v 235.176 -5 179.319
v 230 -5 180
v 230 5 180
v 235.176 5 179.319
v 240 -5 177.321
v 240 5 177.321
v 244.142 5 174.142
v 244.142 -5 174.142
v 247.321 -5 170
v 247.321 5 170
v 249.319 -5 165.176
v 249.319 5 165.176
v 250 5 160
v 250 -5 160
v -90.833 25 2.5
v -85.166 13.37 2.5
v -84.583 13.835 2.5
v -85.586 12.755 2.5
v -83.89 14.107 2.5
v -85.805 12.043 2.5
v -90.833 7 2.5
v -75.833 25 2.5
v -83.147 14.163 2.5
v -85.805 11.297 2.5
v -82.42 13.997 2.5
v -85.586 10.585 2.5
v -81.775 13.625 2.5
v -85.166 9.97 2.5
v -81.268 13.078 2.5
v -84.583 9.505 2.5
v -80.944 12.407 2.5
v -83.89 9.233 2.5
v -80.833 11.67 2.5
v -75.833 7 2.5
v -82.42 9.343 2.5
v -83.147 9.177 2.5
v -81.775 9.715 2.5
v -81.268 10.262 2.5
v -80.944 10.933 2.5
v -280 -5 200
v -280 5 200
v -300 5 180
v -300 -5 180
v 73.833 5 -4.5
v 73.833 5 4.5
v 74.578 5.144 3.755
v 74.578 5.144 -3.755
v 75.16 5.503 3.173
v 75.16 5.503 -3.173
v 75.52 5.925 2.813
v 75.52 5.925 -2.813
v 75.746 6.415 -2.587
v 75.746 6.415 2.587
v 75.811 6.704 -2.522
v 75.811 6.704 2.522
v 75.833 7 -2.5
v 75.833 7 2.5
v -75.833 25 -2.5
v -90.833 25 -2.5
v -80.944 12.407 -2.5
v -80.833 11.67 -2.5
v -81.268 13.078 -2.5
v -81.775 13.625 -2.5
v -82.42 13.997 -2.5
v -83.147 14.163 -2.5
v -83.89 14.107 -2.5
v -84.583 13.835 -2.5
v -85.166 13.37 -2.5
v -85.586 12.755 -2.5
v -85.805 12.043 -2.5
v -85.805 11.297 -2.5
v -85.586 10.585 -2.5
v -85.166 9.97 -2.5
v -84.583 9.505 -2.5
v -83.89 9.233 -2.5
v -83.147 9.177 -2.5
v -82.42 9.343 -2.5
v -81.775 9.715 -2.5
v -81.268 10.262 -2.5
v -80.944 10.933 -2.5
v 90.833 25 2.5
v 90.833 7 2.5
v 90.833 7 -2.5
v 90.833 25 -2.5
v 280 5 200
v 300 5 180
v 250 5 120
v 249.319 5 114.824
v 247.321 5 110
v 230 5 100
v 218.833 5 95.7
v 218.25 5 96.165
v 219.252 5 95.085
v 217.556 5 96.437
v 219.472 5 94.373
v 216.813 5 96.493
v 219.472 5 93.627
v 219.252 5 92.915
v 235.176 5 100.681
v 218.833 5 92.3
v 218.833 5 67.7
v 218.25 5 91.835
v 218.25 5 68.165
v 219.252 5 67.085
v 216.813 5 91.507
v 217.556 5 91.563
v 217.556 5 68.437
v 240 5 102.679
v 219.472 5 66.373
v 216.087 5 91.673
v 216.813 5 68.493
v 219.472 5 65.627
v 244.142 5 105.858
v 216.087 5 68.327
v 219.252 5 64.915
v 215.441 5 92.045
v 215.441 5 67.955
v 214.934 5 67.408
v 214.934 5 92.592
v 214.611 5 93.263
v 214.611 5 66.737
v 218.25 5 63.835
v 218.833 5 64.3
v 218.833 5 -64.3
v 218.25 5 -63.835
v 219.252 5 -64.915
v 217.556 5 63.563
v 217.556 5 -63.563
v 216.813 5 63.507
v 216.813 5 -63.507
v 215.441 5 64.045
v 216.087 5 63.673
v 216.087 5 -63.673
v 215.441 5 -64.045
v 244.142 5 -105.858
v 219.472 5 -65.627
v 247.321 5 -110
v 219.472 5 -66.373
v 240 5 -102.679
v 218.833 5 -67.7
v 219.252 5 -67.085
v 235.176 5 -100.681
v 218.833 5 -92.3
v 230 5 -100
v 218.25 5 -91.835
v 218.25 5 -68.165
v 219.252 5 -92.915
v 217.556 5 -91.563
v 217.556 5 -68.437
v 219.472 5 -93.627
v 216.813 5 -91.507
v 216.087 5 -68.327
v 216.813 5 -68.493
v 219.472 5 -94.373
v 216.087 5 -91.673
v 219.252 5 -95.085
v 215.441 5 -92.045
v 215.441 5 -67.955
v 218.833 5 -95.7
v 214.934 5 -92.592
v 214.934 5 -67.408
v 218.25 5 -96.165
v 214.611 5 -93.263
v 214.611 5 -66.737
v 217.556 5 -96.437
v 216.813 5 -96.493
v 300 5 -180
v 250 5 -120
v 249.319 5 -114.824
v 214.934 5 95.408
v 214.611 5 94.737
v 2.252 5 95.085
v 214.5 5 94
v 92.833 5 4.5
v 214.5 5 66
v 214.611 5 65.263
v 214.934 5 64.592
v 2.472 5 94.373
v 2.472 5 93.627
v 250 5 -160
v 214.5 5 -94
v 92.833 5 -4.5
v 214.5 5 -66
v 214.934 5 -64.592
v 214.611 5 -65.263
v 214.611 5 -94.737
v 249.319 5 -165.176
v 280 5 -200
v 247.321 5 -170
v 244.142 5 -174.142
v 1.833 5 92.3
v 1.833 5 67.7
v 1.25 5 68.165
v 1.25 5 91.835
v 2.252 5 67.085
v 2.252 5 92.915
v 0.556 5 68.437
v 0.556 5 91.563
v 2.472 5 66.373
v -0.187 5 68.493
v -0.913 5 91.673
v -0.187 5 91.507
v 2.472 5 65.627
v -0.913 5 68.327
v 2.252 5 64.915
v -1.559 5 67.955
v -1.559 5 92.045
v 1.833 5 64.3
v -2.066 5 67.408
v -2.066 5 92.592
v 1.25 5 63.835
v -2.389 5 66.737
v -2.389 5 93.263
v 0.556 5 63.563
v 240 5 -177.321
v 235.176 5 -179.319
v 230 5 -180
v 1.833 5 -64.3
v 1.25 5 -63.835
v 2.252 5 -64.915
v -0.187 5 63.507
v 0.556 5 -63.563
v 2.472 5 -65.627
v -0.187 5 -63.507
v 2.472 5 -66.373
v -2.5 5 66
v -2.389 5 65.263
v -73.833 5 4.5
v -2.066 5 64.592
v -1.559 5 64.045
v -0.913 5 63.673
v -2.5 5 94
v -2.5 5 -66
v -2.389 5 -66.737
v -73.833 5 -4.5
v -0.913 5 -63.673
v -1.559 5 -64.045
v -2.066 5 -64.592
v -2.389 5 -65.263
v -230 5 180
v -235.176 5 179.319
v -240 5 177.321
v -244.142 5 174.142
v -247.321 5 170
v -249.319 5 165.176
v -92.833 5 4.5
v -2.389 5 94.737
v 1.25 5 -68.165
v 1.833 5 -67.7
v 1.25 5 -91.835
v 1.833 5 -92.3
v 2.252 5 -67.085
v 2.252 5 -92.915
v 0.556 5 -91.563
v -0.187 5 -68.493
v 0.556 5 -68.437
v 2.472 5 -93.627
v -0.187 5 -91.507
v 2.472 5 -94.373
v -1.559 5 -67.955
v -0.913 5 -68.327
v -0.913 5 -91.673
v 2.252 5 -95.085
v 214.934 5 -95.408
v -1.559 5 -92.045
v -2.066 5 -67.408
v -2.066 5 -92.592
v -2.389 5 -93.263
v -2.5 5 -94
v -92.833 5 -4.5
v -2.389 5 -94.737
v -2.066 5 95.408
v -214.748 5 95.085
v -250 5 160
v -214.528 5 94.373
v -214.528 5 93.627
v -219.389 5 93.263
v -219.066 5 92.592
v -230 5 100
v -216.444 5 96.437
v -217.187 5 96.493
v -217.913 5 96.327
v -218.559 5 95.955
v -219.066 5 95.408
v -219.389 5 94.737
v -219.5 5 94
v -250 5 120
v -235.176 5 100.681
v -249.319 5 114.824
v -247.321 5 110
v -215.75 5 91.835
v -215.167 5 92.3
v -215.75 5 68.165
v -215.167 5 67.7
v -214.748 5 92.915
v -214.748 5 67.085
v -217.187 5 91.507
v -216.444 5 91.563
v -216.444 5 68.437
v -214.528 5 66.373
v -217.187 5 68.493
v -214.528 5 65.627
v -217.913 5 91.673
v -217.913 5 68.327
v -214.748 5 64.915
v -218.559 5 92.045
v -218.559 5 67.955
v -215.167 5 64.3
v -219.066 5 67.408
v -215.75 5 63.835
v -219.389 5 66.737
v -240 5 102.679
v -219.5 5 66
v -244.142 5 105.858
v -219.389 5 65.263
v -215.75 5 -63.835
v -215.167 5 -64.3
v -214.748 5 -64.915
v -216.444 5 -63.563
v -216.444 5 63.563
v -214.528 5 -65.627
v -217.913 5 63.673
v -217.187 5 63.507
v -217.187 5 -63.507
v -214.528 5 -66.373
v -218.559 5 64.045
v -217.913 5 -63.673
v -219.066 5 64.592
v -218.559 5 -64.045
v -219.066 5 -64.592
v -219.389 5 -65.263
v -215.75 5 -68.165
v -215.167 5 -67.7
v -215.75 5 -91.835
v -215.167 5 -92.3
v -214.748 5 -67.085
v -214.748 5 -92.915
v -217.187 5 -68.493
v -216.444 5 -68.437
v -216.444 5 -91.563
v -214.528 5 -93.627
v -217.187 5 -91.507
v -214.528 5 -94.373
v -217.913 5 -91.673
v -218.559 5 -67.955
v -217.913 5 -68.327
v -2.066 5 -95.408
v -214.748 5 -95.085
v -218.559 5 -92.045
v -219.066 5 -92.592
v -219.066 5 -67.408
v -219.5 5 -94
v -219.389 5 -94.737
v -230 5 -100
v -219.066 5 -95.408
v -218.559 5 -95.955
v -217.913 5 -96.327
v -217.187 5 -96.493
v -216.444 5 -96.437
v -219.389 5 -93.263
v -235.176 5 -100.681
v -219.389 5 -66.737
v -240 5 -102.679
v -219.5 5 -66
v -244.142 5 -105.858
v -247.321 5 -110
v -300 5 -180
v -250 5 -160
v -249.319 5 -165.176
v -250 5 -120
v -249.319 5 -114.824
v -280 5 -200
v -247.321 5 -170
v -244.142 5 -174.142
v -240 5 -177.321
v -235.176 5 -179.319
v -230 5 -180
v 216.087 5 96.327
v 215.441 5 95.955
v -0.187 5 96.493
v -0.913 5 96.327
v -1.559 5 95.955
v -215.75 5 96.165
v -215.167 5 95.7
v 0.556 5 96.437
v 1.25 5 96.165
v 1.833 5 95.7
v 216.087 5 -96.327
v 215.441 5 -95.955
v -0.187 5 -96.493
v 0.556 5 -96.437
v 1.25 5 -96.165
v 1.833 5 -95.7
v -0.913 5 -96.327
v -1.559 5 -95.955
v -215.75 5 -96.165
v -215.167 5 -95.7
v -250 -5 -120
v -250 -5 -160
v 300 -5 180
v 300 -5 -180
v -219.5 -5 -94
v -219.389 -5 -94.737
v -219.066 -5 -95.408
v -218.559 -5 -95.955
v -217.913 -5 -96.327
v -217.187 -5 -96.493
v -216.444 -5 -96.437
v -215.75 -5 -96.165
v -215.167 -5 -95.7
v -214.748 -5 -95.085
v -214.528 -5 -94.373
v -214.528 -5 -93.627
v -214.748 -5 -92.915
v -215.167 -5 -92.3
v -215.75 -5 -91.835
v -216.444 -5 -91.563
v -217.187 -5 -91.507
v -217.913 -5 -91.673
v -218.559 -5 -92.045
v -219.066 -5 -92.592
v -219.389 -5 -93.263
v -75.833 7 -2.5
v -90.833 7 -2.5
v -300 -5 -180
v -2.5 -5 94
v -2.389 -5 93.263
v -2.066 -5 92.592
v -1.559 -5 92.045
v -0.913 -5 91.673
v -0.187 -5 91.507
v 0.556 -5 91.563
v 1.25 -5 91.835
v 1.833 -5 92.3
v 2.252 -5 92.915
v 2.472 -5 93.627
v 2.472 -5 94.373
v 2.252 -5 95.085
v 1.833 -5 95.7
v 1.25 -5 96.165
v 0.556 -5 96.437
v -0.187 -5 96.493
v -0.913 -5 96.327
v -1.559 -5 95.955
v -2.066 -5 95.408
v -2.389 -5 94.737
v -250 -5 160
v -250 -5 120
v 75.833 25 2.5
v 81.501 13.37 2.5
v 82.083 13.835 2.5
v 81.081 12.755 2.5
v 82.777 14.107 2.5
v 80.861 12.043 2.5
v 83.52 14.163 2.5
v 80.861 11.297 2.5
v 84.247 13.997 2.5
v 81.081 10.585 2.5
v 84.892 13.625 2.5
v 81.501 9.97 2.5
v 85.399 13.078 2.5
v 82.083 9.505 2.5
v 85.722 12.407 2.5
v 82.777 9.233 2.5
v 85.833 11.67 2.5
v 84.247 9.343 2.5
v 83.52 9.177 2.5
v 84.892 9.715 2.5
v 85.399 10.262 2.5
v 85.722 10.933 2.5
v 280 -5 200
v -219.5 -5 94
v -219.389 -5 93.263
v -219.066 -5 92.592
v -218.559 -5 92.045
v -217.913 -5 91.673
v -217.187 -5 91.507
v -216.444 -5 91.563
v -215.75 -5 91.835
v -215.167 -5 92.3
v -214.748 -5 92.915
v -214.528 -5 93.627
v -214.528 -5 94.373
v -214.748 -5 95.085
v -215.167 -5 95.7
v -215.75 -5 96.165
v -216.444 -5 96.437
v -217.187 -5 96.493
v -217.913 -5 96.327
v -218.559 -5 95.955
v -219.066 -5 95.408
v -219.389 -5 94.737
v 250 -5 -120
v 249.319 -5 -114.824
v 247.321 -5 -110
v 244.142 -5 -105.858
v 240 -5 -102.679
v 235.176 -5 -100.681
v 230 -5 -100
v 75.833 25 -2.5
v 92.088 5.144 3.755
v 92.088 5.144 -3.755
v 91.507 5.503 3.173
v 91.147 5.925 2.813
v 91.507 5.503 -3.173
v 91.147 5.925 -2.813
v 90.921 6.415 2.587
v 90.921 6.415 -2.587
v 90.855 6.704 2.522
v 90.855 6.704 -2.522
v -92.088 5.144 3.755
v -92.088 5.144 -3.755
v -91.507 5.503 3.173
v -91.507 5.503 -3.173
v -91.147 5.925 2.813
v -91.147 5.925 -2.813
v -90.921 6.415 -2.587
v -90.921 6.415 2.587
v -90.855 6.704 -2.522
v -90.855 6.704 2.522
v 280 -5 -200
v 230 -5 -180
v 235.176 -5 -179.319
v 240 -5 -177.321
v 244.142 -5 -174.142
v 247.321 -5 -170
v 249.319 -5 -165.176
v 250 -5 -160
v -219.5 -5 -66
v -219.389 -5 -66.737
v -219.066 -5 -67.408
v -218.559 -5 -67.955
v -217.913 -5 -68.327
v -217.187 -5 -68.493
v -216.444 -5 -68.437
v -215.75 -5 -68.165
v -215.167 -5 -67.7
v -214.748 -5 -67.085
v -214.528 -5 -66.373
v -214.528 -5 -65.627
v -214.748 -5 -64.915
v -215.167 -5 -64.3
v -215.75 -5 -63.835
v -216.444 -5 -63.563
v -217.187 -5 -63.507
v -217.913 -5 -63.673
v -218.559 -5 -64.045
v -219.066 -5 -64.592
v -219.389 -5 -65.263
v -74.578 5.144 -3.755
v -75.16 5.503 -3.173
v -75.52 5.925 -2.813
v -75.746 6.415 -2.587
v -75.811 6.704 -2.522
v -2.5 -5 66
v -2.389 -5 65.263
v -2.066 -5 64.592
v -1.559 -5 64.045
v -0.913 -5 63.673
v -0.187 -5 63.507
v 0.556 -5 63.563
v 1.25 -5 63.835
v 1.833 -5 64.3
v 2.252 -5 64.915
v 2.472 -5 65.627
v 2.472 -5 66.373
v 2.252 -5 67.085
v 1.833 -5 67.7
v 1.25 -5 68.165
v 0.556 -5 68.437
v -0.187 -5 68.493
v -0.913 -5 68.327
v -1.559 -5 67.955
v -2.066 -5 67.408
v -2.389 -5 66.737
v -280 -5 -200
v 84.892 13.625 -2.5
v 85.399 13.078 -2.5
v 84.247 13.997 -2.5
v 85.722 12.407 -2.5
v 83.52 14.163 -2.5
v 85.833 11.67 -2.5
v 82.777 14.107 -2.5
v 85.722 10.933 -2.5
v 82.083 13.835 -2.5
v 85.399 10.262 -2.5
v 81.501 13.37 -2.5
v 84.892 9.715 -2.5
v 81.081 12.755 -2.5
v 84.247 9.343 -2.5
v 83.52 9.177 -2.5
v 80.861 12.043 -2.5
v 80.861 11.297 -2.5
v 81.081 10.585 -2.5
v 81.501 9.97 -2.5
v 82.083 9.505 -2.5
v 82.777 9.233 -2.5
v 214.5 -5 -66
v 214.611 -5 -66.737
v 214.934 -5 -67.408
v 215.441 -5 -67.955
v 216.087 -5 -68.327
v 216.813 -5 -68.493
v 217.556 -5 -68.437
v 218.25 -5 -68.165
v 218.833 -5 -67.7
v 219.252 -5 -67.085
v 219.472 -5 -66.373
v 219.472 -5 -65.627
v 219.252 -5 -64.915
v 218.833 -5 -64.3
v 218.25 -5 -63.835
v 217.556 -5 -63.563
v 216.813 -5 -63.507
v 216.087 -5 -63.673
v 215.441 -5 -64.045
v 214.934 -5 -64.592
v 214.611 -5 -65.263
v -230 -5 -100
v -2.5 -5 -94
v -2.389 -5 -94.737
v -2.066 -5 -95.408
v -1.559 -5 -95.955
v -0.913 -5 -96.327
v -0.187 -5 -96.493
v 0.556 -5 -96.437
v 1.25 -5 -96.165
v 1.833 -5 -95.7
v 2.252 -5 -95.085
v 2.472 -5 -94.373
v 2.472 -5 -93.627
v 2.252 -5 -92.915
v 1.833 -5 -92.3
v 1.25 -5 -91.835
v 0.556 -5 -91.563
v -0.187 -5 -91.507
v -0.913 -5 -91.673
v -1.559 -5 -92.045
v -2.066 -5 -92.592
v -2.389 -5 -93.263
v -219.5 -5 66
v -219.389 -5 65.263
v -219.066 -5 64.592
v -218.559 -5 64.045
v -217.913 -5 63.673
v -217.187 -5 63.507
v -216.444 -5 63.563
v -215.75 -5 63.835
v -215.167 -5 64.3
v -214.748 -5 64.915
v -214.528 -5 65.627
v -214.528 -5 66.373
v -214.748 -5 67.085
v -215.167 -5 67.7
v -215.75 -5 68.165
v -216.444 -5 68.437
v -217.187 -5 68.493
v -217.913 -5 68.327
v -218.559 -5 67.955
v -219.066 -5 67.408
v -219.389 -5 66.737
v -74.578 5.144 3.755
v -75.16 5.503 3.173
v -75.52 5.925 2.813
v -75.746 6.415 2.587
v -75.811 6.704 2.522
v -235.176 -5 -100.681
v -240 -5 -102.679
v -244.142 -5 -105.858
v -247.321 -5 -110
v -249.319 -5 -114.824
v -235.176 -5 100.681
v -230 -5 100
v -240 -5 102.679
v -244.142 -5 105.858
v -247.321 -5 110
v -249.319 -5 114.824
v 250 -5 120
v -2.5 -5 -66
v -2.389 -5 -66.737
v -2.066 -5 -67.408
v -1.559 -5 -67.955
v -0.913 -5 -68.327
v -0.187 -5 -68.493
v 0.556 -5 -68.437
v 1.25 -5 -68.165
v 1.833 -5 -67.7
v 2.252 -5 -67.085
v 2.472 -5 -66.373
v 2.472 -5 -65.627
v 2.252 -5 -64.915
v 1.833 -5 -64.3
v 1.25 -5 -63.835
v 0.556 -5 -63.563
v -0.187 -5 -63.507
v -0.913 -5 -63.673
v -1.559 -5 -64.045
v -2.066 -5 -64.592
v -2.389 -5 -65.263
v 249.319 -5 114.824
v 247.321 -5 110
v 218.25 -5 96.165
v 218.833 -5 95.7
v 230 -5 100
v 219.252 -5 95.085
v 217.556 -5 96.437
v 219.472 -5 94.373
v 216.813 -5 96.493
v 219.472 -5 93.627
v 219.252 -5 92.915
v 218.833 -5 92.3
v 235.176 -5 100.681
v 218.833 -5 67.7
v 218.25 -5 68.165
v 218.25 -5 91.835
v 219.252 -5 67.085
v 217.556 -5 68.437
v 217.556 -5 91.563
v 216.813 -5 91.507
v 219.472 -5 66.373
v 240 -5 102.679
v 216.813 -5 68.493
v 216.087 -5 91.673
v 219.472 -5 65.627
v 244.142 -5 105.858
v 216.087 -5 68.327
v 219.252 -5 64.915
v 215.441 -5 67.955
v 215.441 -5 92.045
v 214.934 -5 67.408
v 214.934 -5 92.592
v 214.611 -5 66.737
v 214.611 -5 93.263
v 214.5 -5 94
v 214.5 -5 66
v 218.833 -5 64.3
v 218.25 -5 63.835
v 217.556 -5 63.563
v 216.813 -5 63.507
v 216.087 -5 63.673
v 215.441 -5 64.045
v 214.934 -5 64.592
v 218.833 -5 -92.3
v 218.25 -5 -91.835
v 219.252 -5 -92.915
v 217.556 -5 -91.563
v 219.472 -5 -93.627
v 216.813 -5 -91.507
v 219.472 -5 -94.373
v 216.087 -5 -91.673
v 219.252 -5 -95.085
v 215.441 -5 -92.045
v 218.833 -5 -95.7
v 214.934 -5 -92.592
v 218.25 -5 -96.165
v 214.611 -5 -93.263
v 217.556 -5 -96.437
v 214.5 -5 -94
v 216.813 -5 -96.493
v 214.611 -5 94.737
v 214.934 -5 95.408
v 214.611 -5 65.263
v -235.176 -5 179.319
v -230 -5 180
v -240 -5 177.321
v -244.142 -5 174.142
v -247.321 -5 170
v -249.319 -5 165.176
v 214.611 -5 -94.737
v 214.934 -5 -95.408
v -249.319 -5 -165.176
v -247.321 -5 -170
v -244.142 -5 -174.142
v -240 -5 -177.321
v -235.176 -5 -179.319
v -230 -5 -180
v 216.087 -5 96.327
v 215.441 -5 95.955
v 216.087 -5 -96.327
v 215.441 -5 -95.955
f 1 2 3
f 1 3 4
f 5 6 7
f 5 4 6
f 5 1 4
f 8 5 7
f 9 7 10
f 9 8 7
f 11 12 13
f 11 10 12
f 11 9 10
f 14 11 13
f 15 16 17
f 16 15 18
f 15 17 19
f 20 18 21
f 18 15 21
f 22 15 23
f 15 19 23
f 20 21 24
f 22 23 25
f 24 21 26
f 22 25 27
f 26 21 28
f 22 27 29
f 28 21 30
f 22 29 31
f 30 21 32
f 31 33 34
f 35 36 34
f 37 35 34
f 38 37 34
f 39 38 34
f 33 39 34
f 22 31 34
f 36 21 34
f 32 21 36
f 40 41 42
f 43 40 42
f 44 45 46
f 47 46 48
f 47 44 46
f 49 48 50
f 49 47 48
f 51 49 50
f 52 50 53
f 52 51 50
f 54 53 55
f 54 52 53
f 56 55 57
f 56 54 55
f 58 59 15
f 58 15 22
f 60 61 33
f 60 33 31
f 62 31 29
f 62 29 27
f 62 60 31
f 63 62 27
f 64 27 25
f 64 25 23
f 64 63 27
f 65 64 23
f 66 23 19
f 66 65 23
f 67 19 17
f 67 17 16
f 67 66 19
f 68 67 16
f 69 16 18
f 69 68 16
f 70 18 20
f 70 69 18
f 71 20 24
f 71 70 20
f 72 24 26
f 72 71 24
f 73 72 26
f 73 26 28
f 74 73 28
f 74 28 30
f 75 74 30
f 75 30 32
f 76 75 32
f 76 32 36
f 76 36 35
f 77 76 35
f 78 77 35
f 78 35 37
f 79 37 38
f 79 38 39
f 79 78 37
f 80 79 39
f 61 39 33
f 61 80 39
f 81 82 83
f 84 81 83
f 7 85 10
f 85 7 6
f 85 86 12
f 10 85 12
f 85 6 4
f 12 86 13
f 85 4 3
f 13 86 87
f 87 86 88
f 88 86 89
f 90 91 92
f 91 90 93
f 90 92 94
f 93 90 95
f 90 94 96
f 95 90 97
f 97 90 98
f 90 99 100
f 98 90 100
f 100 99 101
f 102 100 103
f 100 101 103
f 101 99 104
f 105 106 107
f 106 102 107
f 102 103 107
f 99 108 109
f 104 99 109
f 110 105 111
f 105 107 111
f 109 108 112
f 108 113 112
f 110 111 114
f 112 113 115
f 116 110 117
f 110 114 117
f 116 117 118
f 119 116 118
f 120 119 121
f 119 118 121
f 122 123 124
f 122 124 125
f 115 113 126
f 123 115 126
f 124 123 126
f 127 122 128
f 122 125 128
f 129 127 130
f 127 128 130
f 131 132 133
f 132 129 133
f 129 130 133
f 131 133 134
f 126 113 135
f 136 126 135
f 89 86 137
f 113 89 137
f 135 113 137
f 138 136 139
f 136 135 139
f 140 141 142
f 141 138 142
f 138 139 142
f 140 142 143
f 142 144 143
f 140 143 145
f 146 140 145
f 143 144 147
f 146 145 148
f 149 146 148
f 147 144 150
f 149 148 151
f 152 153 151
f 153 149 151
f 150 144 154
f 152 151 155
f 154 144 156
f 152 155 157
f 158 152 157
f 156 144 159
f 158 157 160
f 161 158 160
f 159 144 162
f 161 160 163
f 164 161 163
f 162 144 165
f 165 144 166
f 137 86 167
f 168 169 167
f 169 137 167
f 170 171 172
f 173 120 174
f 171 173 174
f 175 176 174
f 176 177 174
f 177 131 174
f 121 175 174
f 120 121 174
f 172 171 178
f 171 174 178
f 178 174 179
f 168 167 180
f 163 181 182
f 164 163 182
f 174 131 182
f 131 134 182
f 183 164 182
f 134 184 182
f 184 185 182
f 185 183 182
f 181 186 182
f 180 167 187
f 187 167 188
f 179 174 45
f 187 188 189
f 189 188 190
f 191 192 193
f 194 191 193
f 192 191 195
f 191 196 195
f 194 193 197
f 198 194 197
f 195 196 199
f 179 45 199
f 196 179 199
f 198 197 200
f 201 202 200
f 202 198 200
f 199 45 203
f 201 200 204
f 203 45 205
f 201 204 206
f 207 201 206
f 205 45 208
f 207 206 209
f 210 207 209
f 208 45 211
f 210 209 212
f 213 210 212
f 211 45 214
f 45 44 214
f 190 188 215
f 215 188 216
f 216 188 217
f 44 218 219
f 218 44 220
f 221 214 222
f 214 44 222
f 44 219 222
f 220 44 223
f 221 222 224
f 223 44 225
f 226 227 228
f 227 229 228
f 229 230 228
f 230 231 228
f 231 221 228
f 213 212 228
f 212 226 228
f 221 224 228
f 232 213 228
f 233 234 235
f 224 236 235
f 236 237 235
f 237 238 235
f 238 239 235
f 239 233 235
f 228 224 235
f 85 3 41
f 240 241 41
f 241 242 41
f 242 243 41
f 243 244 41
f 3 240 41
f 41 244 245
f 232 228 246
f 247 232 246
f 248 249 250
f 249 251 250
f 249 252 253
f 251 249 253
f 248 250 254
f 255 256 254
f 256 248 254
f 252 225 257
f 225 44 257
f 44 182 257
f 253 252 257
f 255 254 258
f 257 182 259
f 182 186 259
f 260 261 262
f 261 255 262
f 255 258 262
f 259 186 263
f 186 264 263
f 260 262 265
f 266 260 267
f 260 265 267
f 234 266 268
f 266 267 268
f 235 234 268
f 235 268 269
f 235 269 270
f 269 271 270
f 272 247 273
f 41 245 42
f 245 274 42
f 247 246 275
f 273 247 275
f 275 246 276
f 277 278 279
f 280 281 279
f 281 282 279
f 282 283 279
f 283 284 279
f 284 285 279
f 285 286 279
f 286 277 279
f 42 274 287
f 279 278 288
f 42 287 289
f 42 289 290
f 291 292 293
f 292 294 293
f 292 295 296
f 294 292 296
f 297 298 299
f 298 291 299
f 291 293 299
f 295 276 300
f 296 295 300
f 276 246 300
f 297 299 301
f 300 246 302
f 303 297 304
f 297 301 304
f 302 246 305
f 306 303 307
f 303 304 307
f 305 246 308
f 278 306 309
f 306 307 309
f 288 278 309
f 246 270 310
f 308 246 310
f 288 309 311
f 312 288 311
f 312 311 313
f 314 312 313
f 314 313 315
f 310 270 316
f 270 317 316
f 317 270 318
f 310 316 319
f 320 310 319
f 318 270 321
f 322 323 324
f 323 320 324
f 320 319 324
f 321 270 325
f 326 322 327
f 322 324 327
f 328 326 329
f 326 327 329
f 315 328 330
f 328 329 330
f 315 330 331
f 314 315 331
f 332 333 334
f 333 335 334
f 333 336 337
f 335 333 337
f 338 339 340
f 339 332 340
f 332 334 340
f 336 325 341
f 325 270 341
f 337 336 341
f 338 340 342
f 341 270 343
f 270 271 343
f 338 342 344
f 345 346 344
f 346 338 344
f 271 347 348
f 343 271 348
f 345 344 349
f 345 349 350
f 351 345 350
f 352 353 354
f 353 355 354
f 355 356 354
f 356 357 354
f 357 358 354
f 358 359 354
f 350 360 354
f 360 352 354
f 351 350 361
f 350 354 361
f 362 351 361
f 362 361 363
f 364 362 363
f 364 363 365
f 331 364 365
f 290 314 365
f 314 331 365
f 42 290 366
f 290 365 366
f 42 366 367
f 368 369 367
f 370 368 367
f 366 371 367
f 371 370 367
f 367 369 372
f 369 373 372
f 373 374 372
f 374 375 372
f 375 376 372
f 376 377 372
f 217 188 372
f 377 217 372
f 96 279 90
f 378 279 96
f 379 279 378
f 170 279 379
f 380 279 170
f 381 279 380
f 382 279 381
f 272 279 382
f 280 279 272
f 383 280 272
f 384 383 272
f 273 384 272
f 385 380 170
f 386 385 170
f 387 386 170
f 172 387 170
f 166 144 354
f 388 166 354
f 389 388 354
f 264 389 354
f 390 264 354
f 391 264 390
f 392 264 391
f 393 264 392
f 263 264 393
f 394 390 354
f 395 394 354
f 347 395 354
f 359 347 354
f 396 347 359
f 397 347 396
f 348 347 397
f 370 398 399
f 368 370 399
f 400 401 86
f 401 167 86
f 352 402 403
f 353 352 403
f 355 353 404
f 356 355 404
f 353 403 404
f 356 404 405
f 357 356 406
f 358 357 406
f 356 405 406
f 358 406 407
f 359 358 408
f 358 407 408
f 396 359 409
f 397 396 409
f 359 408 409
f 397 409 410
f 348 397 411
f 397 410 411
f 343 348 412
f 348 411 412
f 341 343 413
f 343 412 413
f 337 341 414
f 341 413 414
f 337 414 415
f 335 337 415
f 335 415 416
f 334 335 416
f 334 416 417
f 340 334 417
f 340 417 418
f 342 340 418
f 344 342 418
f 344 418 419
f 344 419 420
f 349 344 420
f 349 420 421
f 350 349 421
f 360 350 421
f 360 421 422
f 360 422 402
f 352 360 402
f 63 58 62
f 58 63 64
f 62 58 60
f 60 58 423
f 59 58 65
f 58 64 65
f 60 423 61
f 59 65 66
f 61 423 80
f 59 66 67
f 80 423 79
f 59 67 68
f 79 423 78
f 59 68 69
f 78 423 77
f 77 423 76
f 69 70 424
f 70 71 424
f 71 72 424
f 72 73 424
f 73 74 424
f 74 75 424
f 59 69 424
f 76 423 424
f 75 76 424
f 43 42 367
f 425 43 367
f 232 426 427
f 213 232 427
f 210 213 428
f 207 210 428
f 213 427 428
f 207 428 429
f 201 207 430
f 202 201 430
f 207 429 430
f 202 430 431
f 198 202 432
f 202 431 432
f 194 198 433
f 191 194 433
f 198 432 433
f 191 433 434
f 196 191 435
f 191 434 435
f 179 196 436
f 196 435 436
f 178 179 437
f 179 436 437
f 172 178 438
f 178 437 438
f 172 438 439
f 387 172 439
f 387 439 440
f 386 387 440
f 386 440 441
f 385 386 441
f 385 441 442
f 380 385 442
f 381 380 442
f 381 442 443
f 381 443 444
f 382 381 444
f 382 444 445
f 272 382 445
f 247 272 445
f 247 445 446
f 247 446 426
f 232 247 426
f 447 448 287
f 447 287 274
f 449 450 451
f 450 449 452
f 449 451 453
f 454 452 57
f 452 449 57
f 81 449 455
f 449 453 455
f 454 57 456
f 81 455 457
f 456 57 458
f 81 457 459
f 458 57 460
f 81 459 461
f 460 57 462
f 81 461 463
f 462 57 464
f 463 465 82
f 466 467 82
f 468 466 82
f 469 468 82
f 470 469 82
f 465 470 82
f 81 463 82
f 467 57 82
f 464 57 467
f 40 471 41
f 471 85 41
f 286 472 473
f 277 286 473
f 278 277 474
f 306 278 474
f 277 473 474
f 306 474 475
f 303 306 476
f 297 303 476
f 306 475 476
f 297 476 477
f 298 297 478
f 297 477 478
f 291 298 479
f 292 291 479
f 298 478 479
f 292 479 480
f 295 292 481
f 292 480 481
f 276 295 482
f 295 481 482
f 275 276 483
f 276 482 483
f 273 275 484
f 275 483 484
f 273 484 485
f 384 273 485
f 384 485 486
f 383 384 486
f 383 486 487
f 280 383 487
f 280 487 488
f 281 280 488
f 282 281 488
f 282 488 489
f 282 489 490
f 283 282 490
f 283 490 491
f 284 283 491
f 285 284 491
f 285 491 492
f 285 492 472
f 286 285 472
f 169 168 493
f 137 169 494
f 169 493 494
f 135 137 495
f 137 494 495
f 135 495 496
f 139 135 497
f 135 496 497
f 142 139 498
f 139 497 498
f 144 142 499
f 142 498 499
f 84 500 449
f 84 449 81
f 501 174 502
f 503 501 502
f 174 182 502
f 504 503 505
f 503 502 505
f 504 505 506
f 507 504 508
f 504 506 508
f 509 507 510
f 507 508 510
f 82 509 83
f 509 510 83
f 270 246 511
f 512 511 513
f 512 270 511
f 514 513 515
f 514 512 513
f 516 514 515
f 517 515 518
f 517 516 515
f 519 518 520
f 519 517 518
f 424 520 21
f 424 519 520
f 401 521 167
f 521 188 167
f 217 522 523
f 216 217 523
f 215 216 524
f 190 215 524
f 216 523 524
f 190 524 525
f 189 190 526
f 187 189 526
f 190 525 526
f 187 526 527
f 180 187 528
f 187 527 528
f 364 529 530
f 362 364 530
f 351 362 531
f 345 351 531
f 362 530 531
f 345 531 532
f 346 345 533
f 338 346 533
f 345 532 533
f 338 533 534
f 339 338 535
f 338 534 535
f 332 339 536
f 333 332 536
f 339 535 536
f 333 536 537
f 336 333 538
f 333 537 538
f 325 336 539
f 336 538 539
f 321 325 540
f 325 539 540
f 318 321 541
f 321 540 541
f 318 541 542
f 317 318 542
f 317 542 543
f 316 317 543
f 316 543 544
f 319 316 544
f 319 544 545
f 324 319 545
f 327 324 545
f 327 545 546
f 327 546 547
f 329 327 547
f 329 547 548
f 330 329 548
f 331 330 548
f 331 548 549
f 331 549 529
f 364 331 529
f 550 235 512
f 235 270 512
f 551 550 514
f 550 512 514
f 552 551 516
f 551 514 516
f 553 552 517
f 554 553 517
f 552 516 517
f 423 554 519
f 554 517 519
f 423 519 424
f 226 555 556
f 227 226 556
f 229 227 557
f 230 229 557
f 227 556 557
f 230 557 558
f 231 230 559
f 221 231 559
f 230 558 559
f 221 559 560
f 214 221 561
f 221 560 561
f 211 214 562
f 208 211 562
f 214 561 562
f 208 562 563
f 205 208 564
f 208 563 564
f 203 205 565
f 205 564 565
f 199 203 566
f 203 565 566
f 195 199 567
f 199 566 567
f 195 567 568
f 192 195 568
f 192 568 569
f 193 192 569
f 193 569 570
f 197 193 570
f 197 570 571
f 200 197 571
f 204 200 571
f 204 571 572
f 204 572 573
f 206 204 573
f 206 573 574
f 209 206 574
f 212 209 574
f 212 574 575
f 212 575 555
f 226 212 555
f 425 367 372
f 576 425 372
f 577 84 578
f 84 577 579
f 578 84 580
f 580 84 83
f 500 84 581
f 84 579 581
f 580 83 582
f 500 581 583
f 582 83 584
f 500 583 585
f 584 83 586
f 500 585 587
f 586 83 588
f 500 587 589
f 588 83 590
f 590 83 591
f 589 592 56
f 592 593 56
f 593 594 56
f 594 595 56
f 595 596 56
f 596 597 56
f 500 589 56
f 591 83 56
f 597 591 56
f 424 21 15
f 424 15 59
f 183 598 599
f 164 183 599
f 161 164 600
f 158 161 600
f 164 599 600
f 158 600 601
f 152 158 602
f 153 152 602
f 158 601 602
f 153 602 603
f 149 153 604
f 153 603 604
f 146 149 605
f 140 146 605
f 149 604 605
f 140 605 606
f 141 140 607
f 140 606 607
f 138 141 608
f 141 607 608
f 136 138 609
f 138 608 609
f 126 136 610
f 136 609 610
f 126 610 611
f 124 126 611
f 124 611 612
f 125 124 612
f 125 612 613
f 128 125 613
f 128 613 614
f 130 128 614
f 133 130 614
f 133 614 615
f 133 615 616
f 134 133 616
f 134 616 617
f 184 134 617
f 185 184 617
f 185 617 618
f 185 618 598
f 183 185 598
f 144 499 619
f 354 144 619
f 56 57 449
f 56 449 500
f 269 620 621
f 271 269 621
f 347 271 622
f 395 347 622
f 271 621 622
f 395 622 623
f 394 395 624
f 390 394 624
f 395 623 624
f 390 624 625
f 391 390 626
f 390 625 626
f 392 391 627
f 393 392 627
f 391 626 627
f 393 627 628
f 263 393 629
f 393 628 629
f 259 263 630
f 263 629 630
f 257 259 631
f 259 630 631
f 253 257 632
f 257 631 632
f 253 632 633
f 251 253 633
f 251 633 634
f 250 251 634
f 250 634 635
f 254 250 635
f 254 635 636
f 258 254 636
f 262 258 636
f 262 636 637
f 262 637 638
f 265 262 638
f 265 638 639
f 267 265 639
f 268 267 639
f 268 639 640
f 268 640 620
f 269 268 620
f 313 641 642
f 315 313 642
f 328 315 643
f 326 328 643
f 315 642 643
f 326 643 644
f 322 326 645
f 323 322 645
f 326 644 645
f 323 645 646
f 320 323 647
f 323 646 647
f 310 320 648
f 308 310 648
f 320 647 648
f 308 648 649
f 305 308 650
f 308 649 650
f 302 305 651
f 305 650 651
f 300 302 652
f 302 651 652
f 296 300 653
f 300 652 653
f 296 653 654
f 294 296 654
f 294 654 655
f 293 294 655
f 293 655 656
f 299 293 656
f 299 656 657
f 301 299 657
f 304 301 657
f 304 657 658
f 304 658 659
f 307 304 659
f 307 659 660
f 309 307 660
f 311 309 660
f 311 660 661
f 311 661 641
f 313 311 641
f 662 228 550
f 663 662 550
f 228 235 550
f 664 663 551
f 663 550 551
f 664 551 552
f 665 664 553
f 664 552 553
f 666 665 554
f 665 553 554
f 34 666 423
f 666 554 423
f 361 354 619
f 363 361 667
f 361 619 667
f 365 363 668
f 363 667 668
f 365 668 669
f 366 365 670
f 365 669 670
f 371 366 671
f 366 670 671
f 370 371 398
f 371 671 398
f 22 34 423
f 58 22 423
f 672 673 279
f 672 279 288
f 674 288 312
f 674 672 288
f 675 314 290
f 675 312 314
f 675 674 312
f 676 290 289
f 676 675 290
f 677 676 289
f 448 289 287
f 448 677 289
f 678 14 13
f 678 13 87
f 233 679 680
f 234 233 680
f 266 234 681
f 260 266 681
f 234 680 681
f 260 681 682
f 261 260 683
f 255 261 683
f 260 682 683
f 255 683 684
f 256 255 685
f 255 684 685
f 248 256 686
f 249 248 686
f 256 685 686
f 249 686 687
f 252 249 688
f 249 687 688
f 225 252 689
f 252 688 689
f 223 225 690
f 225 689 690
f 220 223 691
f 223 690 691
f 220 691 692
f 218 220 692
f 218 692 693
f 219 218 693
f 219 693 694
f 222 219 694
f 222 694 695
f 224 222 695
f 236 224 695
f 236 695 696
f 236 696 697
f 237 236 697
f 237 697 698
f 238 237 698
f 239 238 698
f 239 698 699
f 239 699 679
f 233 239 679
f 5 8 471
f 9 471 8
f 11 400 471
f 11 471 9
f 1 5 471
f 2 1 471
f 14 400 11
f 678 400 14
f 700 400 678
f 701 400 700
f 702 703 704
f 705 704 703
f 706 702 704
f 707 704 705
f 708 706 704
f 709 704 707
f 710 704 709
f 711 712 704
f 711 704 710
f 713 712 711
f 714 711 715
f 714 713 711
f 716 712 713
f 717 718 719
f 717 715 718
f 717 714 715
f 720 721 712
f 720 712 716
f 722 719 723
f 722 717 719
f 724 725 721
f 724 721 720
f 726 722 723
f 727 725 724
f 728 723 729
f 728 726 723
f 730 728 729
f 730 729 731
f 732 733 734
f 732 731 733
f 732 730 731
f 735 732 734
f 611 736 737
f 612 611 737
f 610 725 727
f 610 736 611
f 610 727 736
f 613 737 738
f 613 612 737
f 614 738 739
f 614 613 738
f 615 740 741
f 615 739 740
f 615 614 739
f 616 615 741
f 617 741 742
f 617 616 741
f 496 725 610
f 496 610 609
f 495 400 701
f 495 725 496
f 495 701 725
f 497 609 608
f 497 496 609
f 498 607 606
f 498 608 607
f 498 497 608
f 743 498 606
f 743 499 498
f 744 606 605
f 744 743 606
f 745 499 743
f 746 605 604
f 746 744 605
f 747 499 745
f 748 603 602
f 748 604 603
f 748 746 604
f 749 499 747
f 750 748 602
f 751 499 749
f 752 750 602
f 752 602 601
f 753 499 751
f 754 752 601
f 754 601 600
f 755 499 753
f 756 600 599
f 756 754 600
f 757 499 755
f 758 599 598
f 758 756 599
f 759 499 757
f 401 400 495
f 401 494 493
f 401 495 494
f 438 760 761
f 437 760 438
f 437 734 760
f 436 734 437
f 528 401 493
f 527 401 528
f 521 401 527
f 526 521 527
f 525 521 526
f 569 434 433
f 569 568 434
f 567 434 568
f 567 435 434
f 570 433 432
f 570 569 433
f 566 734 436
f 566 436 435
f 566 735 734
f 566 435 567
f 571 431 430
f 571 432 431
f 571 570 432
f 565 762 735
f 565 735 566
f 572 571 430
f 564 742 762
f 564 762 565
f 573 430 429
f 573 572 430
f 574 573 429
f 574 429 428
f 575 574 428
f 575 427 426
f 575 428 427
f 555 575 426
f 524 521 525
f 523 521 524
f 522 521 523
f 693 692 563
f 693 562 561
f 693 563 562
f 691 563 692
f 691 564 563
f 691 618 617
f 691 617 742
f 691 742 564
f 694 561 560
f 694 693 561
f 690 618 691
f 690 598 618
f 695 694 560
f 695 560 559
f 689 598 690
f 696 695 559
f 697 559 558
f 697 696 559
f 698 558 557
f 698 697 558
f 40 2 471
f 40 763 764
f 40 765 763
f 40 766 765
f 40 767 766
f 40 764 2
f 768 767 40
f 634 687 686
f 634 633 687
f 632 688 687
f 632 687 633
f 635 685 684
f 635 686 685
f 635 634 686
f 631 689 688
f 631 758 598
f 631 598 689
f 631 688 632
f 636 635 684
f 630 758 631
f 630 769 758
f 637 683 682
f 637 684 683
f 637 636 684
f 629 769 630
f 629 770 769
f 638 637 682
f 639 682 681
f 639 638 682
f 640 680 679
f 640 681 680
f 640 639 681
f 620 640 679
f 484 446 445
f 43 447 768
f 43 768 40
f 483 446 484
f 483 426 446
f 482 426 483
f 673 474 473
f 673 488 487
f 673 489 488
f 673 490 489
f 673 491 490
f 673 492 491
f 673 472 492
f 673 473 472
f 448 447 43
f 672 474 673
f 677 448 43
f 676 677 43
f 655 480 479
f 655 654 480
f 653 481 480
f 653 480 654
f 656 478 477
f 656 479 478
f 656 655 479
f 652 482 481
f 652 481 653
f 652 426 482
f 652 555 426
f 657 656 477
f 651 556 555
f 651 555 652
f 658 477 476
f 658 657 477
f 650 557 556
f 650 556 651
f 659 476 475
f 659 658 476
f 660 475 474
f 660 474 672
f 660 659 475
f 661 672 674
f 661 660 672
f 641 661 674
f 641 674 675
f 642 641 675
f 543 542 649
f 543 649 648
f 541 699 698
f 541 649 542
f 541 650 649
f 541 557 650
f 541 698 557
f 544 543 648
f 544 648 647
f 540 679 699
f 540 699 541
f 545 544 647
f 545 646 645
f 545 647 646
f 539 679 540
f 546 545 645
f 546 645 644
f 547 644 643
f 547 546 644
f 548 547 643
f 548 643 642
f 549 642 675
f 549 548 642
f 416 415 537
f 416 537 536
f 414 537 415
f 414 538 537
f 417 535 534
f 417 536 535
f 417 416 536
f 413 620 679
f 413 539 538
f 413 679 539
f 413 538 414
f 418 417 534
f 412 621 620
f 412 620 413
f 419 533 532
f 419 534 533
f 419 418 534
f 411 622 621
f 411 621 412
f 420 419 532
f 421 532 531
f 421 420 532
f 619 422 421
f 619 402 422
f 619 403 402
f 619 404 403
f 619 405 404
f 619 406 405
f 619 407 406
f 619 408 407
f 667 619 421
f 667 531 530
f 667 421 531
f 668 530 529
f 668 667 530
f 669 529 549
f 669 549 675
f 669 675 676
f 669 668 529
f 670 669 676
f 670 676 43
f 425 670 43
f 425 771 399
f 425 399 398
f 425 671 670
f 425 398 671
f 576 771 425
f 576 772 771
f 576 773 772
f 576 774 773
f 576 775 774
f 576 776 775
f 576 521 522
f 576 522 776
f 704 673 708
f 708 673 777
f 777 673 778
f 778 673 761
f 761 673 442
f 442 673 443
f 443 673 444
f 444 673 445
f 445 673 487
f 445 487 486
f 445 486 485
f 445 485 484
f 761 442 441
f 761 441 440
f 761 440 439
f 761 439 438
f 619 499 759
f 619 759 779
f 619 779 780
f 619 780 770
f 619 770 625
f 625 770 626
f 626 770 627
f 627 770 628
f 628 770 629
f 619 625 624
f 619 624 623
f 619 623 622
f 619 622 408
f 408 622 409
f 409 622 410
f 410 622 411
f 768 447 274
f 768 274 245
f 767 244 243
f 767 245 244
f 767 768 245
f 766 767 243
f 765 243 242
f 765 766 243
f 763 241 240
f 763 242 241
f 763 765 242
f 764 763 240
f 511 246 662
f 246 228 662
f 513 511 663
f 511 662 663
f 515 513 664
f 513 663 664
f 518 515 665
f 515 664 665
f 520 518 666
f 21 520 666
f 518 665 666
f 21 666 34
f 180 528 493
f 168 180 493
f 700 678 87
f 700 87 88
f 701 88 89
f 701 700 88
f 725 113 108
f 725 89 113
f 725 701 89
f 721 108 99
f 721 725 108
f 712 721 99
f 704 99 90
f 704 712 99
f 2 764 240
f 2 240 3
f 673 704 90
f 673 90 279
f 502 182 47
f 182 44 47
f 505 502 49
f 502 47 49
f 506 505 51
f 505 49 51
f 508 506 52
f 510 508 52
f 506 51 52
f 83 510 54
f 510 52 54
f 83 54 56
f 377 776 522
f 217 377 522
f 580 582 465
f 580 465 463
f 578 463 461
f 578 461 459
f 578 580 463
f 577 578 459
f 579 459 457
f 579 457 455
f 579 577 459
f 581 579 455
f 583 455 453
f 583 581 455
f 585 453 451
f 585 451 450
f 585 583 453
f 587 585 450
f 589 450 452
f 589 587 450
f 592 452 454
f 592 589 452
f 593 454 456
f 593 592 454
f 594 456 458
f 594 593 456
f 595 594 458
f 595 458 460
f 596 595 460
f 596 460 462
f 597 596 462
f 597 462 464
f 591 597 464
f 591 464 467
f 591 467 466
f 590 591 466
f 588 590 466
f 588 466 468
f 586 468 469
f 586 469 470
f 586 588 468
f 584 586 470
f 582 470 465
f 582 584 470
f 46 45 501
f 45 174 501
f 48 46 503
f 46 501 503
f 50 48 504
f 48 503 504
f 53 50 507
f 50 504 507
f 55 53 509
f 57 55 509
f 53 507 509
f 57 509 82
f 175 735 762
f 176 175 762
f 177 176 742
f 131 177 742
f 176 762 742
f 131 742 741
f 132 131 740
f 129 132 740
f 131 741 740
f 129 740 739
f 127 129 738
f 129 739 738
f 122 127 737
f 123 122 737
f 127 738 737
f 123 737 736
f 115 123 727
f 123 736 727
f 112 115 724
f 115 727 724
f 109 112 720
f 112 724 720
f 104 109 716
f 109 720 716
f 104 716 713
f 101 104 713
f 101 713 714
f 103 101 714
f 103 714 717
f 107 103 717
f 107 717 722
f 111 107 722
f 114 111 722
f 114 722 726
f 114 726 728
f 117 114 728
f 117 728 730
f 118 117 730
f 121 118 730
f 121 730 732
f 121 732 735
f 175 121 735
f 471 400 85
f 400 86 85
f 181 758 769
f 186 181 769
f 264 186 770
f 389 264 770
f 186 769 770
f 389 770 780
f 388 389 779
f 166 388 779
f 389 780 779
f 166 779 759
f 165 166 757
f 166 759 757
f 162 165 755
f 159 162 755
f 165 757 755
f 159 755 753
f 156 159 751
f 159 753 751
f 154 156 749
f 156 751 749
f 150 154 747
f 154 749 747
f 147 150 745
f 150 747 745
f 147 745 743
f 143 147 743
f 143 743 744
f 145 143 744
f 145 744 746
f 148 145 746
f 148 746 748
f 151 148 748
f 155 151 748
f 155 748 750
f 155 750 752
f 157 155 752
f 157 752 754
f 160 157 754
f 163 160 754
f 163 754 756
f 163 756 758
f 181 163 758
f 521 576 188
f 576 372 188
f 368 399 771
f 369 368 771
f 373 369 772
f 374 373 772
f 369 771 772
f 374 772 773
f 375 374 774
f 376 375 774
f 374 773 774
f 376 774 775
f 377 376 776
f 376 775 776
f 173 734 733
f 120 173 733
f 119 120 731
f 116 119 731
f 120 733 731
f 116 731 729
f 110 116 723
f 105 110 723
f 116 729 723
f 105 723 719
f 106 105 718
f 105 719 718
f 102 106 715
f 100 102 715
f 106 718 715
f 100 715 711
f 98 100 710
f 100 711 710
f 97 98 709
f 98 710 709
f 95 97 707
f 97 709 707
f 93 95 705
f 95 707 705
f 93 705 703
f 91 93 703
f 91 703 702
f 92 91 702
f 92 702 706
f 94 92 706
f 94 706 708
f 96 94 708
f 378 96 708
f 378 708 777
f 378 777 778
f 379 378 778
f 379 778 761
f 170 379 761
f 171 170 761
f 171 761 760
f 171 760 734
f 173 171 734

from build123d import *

# Parameters (mm, degrees)
BOSS_EXTRUDE1_DEPTH           = 5
CUT_EXTRUDE1_DEPTH            = 361.589794642
CUT_EXTRUDE1_DEPTH_BACK       = 361.589794642
SKETCH3_W                     = 7.5
SKETCH3_H                     = 5
BOSS_EXTRUDE2_DEPTH           = 20
F_5_0MM_START                 = -2.5
F_5_0MM_DOWEL_HOLE1_OUTLINE_R = 2.5
F_5_0MM_DOWEL_HOLE1_DEPTH     = 5
FILLET1_R                     = 2
F_5_0MM_DOWEL_HOLE3_D         = 5


# Read off the part's stored shape, not the designer's step: Ø5.0mm Dowel Hole1
with BuildPart() as part:
    # Sketch1 → Boss-Extrude1 (new, symmetric)
    with BuildSketch(Plane(origin=(0, 0, 0), x_dir=(1, 0, 0), z_dir=(0, 1, 0))):
        Polygon((-300, 180), (-280, 200), (280, 200), (300, 180), (300, -180), (280, -200), (-280, -200), (-300, -180), align=None)
    extrude(amount=BOSS_EXTRUDE1_DEPTH, both=True)

    # Sketch2 → Cut-Extrude1 (cut, two sides: drawn at the far end of the back side and taken through both)
    with BuildSketch(Plane(origin=(0, 0, 0), x_dir=(1, 0, 0), z_dir=(0, 1, 0)).offset(-CUT_EXTRUDE1_DEPTH_BACK)):
        with BuildLine():
            Line((-230, 180), (230, 180))
            ThreePointArc((230, 180), (244.142135624, 174.142135624), (250, 160))
            Line((250, 160), (250, 120))
            ThreePointArc((250, 120), (244.142135624, 105.857864376), (230, 100))
            Line((230, 100), (-230, 100))
            ThreePointArc((-230, 100), (-244.142135624, 105.857864376), (-250, 120))
            Line((-250, 120), (-250, 160))
            ThreePointArc((-250, 160), (-244.142135624, 174.142135624), (-230, 180))
        make_face()
        with BuildLine():
            Line((250, -160), (250, -120))
            ThreePointArc((250, -120), (244.142135624, -105.857864376), (230, -100))
            Line((230, -100), (-230, -100))
            ThreePointArc((-230, -100), (-244.142135624, -105.857864376), (-250, -120))
            Line((-250, -120), (-250, -160))
            ThreePointArc((-250, -160), (-244.142135624, -174.142135624), (-230, -180))
            Line((-230, -180), (230, -180))
            ThreePointArc((230, -180), (244.142135624, -174.142135624), (250, -160))
        make_face()
    extrude(amount=CUT_EXTRUDE1_DEPTH + CUT_EXTRUDE1_DEPTH_BACK, mode=Mode.SUBTRACT)

    # Sketch3 → Boss-Extrude2 (add)
    with BuildSketch(Plane(origin=(0, 5, 0), x_dir=(1, 0, 0), z_dir=(0, 1, 0))):
        with Locations((-87.083333333, 0)):
            Rectangle(SKETCH3_W, SKETCH3_H)
        with Locations((-79.583333333, 0)):
            Rectangle(SKETCH3_W, SKETCH3_H)
        with Locations((79.583333333, 0)):
            Rectangle(SKETCH3_W, SKETCH3_H)
        with Locations((87.083333333, 0)):
            Rectangle(SKETCH3_W, SKETCH3_H)
    extrude(amount=BOSS_EXTRUDE2_DEPTH)

    # Ø5.0mm Dowel Hole1 outline → Ø5.0mm Dowel Hole1 (cut)
    with BuildSketch(Plane.XY.offset(F_5_0MM_START)):
        with Locations((83.333333333, 11.67)):
            Circle(F_5_0MM_DOWEL_HOLE1_OUTLINE_R)
        with Locations((-83.333333333, 11.67)):
            Circle(F_5_0MM_DOWEL_HOLE1_OUTLINE_R)
    extrude(amount=F_5_0MM_DOWEL_HOLE1_DEPTH, mode=Mode.SUBTRACT)

    # Fillet1
    fillet1_edges = [part.edges().sort_by_distance(p)[0] for p in [
        (-90.833333333, 5, 0),
        (-83.333333333, 5, 2.5),
        (-83.333333333, 5, -2.5),
        (-75.833333333, 5, 0),
        (75.833333333, 5, 0),
        (83.333333333, 5, 2.5),
        (83.333333333, 5, -2.5),
        (90.833333333, 5, 0),
    ]]
    fillet(fillet1_edges, radius=FILLET1_R)

    # Ø5.0mm Dowel Hole3 (through all)
    with Locations(Plane(origin=(0, 5, 0), x_dir=(1, 0, 0), z_dir=(0, 1, 0))):
        with Locations((-217, 94), (-217, 66), (-217, -94), (-217, -66), (0, 94), (0, 66), (0, -66), (0, -94), (217, -94), (217, -66), (217, 66), (217, 94)):
            Hole(F_5_0MM_DOWEL_HOLE3_D / 2)


solid = part.part
